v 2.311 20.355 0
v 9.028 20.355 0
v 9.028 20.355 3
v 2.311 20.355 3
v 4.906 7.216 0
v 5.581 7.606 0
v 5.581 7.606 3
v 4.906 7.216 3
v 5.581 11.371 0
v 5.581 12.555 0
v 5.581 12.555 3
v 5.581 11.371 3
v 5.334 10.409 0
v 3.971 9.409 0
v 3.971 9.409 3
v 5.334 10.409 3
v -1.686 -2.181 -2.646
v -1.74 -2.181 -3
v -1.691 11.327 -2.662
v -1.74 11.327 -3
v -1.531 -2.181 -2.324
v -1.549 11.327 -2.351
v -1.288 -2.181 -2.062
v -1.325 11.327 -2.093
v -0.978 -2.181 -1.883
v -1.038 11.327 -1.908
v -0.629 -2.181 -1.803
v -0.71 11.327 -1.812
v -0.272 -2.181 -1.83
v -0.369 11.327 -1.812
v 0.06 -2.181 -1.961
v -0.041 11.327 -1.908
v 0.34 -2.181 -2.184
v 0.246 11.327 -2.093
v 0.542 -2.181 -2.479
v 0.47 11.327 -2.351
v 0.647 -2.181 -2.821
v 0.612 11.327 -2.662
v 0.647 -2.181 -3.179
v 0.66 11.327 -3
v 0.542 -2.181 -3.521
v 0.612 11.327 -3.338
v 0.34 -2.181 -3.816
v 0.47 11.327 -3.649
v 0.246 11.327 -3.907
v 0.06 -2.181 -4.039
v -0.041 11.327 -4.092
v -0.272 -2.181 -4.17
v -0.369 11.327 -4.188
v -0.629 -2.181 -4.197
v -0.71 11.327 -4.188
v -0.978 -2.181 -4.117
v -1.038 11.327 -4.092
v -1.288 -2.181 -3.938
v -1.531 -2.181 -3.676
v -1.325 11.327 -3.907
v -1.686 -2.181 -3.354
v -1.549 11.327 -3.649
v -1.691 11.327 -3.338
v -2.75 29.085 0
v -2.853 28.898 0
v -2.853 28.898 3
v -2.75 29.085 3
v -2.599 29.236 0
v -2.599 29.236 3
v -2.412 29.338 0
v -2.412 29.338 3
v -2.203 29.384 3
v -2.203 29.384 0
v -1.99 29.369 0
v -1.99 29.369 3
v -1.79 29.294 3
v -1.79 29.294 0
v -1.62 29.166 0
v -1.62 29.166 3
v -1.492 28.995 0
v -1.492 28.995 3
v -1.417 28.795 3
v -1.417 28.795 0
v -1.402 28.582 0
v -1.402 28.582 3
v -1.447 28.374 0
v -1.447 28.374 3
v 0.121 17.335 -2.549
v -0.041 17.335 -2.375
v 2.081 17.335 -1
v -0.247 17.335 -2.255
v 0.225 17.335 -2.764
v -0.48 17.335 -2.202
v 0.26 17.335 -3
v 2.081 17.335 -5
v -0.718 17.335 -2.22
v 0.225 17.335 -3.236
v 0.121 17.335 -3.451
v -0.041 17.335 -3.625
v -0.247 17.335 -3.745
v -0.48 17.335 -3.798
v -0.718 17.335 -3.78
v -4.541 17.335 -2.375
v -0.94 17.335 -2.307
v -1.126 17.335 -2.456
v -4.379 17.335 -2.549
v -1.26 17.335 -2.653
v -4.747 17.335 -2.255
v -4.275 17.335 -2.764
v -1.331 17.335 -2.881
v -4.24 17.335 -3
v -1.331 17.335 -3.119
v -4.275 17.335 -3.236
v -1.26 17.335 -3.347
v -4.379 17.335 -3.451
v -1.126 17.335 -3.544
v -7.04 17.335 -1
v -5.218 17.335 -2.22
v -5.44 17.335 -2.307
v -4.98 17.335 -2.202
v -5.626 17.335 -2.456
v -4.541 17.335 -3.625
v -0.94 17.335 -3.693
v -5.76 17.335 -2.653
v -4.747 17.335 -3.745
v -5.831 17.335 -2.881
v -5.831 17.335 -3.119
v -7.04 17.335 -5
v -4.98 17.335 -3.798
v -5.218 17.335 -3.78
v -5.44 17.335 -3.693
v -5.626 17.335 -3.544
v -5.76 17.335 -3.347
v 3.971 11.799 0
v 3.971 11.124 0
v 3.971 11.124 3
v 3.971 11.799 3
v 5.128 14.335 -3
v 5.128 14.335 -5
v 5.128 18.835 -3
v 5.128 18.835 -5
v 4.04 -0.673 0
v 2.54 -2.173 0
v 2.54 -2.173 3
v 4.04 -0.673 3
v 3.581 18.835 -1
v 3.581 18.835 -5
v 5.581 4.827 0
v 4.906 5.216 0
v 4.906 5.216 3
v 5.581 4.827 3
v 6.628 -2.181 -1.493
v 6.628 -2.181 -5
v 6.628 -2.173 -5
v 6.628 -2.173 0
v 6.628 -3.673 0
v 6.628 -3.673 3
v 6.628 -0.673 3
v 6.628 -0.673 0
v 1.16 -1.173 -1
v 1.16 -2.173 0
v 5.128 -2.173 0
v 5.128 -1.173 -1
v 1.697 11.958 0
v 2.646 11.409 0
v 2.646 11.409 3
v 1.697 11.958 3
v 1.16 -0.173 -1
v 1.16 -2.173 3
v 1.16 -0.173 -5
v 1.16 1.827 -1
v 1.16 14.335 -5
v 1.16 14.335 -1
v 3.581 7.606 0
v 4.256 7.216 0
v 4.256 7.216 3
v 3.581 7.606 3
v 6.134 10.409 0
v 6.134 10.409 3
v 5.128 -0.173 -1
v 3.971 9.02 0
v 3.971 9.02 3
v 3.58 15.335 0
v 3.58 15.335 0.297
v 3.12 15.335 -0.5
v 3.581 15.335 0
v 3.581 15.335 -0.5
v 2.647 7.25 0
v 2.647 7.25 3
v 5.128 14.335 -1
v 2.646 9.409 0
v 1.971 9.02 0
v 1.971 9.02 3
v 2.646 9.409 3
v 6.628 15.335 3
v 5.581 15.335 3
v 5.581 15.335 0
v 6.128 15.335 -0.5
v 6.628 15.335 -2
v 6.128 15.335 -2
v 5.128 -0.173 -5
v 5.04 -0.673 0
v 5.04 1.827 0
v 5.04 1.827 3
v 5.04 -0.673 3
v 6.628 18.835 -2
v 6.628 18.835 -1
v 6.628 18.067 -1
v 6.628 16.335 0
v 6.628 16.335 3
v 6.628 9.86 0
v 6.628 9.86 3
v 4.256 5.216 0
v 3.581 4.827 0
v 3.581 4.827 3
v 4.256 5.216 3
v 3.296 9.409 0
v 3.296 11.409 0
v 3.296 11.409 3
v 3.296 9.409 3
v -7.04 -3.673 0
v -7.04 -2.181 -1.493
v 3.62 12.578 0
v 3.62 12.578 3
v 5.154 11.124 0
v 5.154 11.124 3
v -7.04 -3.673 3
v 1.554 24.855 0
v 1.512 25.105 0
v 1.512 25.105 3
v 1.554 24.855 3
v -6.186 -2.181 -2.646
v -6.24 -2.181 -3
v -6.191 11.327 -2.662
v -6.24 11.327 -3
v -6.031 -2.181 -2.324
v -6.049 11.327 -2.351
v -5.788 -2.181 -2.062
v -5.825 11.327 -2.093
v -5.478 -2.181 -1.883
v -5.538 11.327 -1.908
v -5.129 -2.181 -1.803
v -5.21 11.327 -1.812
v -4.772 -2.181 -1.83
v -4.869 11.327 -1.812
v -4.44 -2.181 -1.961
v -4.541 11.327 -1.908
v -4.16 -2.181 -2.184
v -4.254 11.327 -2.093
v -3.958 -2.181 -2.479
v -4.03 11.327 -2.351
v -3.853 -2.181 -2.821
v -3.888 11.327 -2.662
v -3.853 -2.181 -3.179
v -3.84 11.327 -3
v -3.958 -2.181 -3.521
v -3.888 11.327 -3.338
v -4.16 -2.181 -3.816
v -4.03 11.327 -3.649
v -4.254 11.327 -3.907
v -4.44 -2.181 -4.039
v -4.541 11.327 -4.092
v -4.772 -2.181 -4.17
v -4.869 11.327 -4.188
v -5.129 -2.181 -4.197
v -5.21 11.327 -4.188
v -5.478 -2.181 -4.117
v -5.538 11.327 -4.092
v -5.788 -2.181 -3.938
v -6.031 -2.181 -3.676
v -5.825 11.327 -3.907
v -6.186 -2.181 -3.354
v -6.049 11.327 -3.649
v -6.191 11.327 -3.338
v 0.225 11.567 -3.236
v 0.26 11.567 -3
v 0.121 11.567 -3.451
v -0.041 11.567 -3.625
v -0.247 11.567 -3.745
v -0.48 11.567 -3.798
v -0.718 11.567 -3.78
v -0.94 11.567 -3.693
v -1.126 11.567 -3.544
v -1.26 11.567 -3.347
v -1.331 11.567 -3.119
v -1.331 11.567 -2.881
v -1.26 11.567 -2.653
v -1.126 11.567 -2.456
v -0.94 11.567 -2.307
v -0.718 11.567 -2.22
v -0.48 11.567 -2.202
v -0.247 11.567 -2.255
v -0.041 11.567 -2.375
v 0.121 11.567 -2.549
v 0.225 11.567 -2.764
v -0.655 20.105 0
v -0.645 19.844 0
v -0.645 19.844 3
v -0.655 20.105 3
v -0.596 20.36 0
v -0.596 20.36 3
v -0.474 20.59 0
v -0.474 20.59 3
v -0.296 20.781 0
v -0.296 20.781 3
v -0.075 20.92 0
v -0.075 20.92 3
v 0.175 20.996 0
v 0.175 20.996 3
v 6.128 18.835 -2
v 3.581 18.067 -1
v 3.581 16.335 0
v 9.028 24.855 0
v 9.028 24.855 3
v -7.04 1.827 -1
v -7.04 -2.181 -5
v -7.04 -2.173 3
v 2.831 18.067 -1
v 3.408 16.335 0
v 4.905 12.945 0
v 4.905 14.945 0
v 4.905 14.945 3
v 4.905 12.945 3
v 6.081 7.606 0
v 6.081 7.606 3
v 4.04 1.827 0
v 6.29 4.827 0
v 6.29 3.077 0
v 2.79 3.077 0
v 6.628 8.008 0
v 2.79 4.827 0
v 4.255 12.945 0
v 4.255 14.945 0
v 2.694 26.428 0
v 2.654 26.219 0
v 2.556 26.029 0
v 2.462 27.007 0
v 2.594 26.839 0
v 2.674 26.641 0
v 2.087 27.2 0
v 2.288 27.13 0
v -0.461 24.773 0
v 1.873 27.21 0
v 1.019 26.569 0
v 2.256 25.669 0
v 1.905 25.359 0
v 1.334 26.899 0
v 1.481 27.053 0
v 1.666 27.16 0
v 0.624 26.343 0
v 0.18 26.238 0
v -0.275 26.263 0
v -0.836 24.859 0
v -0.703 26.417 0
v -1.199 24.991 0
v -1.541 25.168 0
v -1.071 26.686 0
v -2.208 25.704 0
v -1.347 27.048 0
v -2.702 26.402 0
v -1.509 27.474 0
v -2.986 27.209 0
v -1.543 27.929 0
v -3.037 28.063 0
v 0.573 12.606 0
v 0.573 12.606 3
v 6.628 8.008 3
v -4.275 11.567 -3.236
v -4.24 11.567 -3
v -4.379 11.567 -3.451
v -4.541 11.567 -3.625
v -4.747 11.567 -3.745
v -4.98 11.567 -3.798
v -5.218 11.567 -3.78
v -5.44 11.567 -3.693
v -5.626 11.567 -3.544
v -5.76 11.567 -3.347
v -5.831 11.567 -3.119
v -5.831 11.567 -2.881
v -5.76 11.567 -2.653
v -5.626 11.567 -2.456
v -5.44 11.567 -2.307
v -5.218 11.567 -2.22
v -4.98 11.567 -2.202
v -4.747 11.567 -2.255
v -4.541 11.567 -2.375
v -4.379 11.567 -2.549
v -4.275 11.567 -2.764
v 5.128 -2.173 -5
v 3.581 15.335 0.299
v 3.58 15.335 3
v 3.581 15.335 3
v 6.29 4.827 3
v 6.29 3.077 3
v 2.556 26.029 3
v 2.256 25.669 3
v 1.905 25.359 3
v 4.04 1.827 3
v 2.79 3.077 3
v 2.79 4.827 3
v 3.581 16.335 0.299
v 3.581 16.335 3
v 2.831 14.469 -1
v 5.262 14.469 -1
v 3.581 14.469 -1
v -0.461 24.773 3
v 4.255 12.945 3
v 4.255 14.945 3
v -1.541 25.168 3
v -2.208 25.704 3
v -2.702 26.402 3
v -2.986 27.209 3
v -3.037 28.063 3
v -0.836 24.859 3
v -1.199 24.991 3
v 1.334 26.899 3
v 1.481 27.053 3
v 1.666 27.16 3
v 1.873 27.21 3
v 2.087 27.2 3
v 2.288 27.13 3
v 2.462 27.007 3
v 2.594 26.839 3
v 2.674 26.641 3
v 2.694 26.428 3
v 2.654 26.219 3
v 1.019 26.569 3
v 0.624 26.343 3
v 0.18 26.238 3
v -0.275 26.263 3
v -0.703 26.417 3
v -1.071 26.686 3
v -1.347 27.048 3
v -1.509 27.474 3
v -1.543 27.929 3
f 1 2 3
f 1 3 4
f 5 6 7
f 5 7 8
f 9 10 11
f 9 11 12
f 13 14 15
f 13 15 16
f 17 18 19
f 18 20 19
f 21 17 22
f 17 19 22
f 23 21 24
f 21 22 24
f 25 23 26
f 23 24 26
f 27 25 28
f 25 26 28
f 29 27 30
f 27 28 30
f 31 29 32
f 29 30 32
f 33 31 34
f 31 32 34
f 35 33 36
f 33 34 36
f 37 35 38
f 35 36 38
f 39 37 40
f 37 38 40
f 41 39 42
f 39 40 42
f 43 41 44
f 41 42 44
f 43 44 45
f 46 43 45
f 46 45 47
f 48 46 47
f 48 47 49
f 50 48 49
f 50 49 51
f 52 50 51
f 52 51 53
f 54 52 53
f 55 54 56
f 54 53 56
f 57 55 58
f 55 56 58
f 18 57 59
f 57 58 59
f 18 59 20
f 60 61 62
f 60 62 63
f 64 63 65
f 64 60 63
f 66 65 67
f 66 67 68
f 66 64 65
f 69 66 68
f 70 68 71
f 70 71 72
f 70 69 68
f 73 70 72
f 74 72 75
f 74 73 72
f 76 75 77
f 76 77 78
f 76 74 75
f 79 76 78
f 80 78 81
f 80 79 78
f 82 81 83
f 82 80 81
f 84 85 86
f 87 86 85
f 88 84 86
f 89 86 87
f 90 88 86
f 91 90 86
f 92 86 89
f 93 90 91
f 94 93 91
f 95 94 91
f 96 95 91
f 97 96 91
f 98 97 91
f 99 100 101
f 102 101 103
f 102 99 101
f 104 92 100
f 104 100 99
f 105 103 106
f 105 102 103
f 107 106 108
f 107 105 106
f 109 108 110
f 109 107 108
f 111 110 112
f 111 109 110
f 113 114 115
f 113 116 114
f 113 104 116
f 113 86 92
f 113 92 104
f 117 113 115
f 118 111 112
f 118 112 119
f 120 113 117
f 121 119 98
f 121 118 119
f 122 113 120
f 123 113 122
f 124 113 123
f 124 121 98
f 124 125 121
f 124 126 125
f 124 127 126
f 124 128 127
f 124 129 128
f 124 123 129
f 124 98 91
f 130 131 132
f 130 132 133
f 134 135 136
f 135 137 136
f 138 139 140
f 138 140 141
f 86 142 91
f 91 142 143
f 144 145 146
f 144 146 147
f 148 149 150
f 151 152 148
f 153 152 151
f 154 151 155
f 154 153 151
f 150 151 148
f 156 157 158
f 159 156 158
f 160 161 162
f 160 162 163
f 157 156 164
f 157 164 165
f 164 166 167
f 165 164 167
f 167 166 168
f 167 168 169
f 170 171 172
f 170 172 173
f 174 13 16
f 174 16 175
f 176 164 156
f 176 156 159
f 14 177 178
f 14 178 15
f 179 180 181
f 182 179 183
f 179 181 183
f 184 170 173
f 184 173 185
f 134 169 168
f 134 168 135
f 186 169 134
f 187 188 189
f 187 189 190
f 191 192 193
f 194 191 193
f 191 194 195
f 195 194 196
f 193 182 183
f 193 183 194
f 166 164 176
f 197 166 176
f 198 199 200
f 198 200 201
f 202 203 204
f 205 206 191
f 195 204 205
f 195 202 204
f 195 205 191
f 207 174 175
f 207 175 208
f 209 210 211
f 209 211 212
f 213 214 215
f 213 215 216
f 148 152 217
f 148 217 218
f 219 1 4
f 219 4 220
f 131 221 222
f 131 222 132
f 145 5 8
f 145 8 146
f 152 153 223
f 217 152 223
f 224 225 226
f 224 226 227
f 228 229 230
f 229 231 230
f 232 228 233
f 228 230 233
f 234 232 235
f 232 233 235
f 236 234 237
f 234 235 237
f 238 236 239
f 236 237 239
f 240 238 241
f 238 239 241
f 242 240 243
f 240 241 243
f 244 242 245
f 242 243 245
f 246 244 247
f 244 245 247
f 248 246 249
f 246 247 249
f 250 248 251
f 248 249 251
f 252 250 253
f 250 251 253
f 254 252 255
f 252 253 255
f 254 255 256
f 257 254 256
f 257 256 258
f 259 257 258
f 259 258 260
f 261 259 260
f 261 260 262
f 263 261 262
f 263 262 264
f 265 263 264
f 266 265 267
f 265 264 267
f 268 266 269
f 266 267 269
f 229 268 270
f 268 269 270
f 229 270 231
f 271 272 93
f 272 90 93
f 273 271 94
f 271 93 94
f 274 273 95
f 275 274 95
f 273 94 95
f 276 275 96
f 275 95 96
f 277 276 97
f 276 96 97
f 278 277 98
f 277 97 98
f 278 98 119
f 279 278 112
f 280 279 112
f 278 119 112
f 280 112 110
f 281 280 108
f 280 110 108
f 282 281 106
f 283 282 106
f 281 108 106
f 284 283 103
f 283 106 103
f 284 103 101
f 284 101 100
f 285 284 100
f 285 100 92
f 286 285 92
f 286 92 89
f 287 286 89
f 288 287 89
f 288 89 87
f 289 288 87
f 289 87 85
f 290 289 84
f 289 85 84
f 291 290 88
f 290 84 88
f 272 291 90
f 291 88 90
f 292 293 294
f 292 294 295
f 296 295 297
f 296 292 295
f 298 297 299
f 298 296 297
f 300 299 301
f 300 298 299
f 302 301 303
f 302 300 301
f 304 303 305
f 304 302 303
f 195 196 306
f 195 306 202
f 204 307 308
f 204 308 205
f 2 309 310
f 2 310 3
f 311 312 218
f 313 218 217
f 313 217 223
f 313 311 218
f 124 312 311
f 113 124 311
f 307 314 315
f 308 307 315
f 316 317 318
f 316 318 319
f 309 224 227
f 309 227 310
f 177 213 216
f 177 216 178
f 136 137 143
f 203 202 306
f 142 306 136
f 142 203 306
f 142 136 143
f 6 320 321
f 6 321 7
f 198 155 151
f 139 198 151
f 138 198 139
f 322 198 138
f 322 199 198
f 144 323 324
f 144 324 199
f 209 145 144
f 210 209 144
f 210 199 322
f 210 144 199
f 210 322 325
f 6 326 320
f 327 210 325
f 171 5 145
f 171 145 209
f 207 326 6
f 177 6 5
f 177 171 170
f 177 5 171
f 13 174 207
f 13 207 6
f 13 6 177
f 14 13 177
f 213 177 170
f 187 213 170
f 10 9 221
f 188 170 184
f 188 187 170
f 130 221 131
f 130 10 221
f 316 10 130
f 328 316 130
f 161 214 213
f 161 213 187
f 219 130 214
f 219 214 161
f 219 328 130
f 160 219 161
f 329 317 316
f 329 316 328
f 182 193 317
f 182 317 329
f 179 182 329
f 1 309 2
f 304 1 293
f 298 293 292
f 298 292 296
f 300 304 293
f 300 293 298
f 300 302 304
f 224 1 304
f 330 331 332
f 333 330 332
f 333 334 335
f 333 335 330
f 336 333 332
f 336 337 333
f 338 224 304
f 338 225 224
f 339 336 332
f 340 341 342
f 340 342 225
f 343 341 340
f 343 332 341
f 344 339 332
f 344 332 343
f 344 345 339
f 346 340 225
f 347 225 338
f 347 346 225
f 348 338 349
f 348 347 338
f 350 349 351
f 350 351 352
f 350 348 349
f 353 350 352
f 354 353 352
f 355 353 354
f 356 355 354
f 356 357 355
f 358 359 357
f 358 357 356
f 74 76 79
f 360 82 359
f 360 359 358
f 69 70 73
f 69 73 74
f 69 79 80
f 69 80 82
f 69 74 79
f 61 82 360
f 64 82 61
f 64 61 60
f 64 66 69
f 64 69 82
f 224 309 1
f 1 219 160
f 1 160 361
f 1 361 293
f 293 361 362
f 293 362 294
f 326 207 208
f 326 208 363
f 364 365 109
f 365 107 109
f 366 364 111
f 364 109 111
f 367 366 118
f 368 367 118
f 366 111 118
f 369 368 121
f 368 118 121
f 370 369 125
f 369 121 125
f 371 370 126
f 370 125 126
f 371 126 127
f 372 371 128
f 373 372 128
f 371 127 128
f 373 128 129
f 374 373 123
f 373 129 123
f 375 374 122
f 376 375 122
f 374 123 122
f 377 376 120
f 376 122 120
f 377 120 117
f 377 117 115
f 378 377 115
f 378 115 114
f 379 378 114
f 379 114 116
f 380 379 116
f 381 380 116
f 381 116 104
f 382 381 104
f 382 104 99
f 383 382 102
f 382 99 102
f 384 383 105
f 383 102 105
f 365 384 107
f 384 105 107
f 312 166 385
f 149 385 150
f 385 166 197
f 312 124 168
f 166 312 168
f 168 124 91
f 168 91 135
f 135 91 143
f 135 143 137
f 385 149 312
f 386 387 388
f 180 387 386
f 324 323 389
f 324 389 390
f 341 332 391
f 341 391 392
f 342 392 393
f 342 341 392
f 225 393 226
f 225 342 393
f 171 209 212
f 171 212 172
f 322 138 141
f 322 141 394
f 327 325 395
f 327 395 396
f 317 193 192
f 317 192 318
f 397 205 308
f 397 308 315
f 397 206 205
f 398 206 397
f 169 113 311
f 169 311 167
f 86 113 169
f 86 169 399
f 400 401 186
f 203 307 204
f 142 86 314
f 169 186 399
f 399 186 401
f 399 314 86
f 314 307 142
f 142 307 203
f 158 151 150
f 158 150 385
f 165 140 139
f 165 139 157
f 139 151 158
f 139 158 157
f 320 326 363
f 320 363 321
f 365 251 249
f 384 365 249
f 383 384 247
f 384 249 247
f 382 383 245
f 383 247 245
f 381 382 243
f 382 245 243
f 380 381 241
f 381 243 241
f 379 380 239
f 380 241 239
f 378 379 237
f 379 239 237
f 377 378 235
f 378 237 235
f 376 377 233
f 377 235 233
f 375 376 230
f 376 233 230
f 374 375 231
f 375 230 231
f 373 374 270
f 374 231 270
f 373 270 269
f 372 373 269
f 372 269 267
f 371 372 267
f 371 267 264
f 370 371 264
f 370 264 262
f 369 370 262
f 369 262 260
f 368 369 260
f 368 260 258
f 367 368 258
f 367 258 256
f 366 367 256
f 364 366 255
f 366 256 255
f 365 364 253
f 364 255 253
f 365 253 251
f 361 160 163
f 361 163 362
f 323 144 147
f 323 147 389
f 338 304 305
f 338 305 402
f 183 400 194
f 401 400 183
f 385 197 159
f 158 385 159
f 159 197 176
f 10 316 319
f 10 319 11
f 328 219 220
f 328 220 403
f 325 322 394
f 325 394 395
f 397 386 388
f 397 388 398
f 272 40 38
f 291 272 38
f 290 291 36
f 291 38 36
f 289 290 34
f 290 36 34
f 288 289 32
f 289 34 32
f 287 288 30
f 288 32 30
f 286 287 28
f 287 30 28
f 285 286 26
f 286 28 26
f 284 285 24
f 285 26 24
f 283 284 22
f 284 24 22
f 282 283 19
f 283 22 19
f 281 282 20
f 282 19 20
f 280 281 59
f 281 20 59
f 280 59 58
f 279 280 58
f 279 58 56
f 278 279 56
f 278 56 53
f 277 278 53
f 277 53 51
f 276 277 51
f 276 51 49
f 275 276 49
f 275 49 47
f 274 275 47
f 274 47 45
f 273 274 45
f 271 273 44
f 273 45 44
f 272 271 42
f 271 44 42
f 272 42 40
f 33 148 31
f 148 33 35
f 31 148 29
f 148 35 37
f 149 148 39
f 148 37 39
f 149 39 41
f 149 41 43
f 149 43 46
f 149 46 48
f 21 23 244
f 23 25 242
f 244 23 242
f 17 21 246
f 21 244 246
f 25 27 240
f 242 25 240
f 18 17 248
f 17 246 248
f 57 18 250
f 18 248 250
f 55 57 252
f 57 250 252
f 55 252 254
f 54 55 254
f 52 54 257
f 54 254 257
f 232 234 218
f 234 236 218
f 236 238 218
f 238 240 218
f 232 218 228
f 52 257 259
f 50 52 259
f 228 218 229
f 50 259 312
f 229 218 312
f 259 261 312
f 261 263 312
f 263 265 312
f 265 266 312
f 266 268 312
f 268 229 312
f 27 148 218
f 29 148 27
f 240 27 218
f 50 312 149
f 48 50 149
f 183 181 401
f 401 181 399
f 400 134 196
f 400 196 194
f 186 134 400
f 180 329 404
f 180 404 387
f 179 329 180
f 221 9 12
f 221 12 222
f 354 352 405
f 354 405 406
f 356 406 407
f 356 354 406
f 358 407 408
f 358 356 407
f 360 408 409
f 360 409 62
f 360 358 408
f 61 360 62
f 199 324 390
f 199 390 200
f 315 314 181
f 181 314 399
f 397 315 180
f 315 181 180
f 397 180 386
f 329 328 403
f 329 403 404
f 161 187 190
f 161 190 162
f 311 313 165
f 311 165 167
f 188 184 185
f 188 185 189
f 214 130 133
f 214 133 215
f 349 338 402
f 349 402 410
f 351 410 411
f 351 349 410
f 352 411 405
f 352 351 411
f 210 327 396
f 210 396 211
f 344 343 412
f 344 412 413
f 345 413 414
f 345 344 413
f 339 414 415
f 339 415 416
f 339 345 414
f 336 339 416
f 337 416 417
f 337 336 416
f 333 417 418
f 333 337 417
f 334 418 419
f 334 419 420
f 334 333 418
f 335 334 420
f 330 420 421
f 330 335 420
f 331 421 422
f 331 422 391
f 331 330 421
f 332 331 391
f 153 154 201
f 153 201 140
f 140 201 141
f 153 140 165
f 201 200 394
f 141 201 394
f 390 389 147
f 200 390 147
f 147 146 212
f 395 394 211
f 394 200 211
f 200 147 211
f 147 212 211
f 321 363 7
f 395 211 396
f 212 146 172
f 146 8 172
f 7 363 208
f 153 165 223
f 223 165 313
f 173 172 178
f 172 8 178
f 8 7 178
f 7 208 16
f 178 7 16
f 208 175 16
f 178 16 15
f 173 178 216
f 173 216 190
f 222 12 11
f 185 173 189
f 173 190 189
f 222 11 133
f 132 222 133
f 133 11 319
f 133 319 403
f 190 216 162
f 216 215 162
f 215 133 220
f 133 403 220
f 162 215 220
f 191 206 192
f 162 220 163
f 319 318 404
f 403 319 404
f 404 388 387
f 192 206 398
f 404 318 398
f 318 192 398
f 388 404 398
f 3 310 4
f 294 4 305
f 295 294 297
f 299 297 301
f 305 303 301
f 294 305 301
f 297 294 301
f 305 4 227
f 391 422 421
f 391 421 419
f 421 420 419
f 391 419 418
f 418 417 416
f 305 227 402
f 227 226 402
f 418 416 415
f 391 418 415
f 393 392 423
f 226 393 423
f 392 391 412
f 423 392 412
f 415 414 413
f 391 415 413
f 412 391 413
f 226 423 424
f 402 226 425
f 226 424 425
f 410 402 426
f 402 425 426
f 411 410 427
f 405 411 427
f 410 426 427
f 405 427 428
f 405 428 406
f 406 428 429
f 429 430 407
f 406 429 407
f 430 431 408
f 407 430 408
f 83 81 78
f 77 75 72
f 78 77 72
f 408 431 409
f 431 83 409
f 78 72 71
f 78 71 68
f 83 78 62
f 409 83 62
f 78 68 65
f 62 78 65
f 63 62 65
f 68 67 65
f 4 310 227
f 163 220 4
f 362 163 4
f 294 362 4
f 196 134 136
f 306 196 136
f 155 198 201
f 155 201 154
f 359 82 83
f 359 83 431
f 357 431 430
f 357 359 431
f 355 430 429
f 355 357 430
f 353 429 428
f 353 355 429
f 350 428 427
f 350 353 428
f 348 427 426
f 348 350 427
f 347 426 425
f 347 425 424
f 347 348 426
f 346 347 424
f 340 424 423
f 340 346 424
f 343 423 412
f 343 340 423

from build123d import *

# Parameters (mm, degrees)
BOSS_SWITCH_BODY_DEPTH                    = 3
SKETCH1_W                                 = 4.0875
SKETCH1_H                                 = 1.5
SKETCH1_W_2                               = 3.046903414
SKETCH1_H_2                               = 3.5
BOSS_FLANGE_WIDTH_DEPTH                   = 5
SKETCH2_W                                 = 4
SKETCH2_H                                 = 2
SKETCH2_W_2                               = 8
SKETCH2_H_2                               = 1.5
BOSS_FLANGE_HEIGHT_DEPTH                  = 10.620596586
CUT_UP_TO_DOWN_DERAILLEUR_CLEARANCE_REACH = 23.629
SKETCH10_W                                = 1.5
SKETCH10_H                                = 3
SKETCH17_W                                = 12.1675
SKETCH17_H                                = 4
BOSS_FLANGE_SUPPORT_DEPTH                 = 17.508325141
TAP_DRILL_FOR_M2X0_4_TAP1_D               = 1.6
M2_CLEARANCE_HOLE2_D                      = 2.4
M2_CLEARANCE_HOLE2_DEPTH                  = 15
M2_CLEARANCE_HOLE2_TIP                    = 0.721032743
CHAMFER_FLANGE_SUPPORT_SIZE               = 1.5
CHAMFER_FLANGE_SUPPORT_2_SIZE             = 1
SKETCH28_W                                = 3.046903414
SKETCH28_H                                = 2.5
CUT_EXTRUDE1_DEPTH                        = 1
CHAMFER10_SIZE                            = 1
CHAMFER10_SIZE2                           = 1.732050808
CHAMFER_FLANGE_SUPPORT_3_SIZE             = 1
CUT_EXTRUDE2_DEPTH                        = 34.862828732
CHAMFER12_SIZE                            = 0.5
CHAMFER12_SIZE2                           = 0.866025404
SKETCH23_W                                = 7.42721664
SKETCH23_H                                = 14.508325141
CUT_GAP_FOR_PRINTING_DEPTH                = 32.000499688
BOSS_EXTRUDE2_DEPTH                       = 8.2
CHAMFER11_SIZE                            = 0.75
CHAMFER11_SIZE_2                          = 1.299038106


# Some blends are built 0.0001 mm under size
with BuildPart() as part:
    # Sketch-SwitchBossUp → Boss-Switch Body (new body)
    with BuildSketch(Plane.XY):
        with BuildLine():
            Line((5.581091204, 12.554885442), (5.58109997, 11.370542897))
            Line((5.58109997, 11.370542897), (5.154266051, 11.12411022))
            Line((5.154266051, 11.12411022), (3.971266051, 11.12411022))
            Line((3.971266051, 11.12411022), (3.97126394, 11.79911022))
            Line((3.97126394, 11.79911022), (3.296271341, 11.409403061))
            Line((3.296271341, 11.409403061), (3.296271341, 9.409403061))
            Line((3.296271341, 9.409403061), (3.971278743, 9.019687356))
            Line((3.971278743, 9.019687356), (3.971278743, 9.409408058))
            Line((3.971278743, 9.409408058), (5.333511297, 10.40941814))
            Line((5.333511297, 10.40941814), (6.133511297, 10.409424062))
            Line((6.133511297, 10.409424062), (6.627976927, 9.860264345))
            Line((6.627976927, 9.860264345), (6.627976927, 8.007577878))
            Line((6.627976927, 8.007577878), (6.081127833, 7.606137899))
            Line((6.081127833, 7.606137899), (5.581127833, 7.606137899))
            Line((5.581127833, 7.606137899), (4.906138119, 7.216432406))
            Line((4.906138119, 7.216432406), (4.906138119, 5.216432406))
            Line((4.906138119, 5.216432406), (5.58114552, 4.826716701))
            Line((5.58114552, 4.826716701), (6.290476927, 4.826716701))
            Line((6.290476927, 4.826716701), (6.290476927, 3.076720436))
            Line((6.290476927, 3.076720436), (5.040476927, 1.826720436))
            Line((5.040476927, 1.826720436), (5.040476927, -0.673279564))
            Line((5.040476927, -0.673279564), (6.627976927, -0.673279564))
            Line((6.627976927, -0.673279564), (6.627976927, -3.673279564))
            Line((6.627976927, -3.673279564), (2.540476927, -3.673279564))
            Line((2.540476927, -3.673279564), (2.540476927, -2.173279564))
            Line((2.540476927, -2.173279564), (4.040476927, -0.673279564))
            Line((4.040476927, -0.673279564), (4.040476927, 1.826720436))
            Line((4.040476927, 1.826720436), (2.790476927, 3.076720436))
            Line((2.790476927, 3.076720436), (2.790476927, 4.826720436))
            Line((2.790476927, 4.826720436), (3.58114552, 4.826720436))
            Line((3.58114552, 4.826720436), (4.256138119, 5.216427595))
            Line((4.256138119, 5.216427595), (4.256138119, 7.216427595))
            Line((4.256138119, 7.216427595), (3.581130717, 7.6061433))
            Line((3.581130717, 7.6061433), (2.64686251, 7.249572244))
            Line((2.64686251, 7.249572244), (1.971281627, 9.019692757))
            Line((1.971281627, 9.019692757), (2.646271341, 9.40939825))
            Line((2.646271341, 9.40939825), (2.646271341, 11.40939825))
            Line((2.646271341, 11.40939825), (1.696557212, 11.957715958))
            Line((1.696557212, 11.957715958), (0.573317845, 12.60621851))
            Line((0.573317845, 12.60621851), (-0.645153605, 19.844362607))
            ThreePointArc((-0.645153605, 19.844362607), (-0.473707256, 20.590279886), (0.174966786, 20.996492176))
            Line((0.174966786, 20.996492176), (-0.46073685, 24.772792819))
            ThreePointArc((-0.46073685, 24.772792819), (-1.019582136, 24.919522879), (-1.541303694, 25.167805745))
            ThreePointArc((-1.541303694, 25.167805745), (-2.872284003, 26.795385437), (-2.852546321, 28.897797067))
            ThreePointArc((-2.852546321, 28.897797067), (-1.887813913, 29.338582026), (-1.447028953, 28.373849618))
            ThreePointArc((-1.447028953, 28.373849618), (-0.703448682, 26.416936722), (1.333779254, 26.898727173))
            ThreePointArc((1.333779254, 26.898727173), (2.379722745, 27.074801628), (2.555797201, 26.028858137))
            ThreePointArc((2.555797201, 26.028858137), (2.086504637, 25.507104397), (1.511513111, 25.104801997))
            Line((1.511513111, 25.104801997), (1.553598189, 24.854801997))
            Line((1.553598189, 24.854801997), (9.027976927, 24.854801997))
            Line((9.027976927, 24.854801997), (9.027976927, 22.354801997))
            Line((9.027976927, 22.354801997), (9.027976927, 20.354801997))
            Line((9.027976927, 20.354801997), (2.311129602, 20.354801997))
            Line((2.311129602, 20.354801997), (3.620242387, 12.578216848))
            Line((3.620242387, 12.578216848), (4.255457038, 12.944958198))
            Line((4.255457038, 12.944958198), (4.255457038, 14.944958198))
            Line((4.255457038, 14.944958198), (3.579805878, 15.335045577))
            Line((3.579805878, 15.335045577), (3.581073513, 15.335045577))
            Line((3.581073513, 15.335045577), (3.581073513, 16.335045577))
            Line((3.581073513, 16.335045577), (5.725580434, 16.335045577))
            Line((5.725580434, 16.335045577), (6.627976927, 16.335045577))
            Line((6.627976927, 16.335045577), (6.627976927, 15.335045577))
            Line((6.627976927, 15.335045577), (5.581099865, 15.335045577))
            Line((5.581099865, 15.335045577), (4.905457038, 14.944963009))
            Line((4.905457038, 14.944963009), (4.905457038, 12.944963009))
            Line((4.905457038, 12.944963009), (5.581091204, 12.554885442))
        make_face()
    extrude(amount=BOSS_SWITCH_BODY_DEPTH)

    # Sketch1 → Boss-Flange Width (add)
    with BuildSketch(Plane(origin=(0, 0, 0), x_dir=(-1, 0, 0), z_dir=(0, 0, -1))):
        with Locations((-4.584226927, -2.923279564)):
            Rectangle(SKETCH1_W, SKETCH1_H)
        with Locations((-5.10452522, 17.085045577)):
            Rectangle(SKETCH1_W_2, SKETCH1_H_2)
    extrude(amount=BOSS_FLANGE_WIDTH_DEPTH)

    # Sketch2 → Boss-Flange Height (add)
    with BuildSketch(Plane(origin=(-7.039523073, 0, 0), x_dir=(0, 0, -1), z_dir=(1, 0, 0))):
        with Locations((3, 16.335045577)):
            Rectangle(SKETCH2_W, SKETCH2_H)
        with Locations((1, -2.923279564)):
            Rectangle(SKETCH2_W_2, SKETCH2_H_2)
    extrude(amount=BOSS_FLANGE_HEIGHT_DEPTH)

    # Sketch10 → Cut-Up-To-Down Derailleur Clearance (cut, up to next)
    with BuildSketch(Plane(origin=(0, 15.335045577, 0), x_dir=(1, 0, 0), z_dir=(0, 1, 0)), mode=Mode.PRIVATE) as cut_up_to_down_derailleur_clearance_sk1:
        with Locations((5.877976927, 3.5)):
            Rectangle(SKETCH10_W, SKETCH10_H)
    cut_up_to_down_derailleur_clearance_tool1 = extrude(cut_up_to_down_derailleur_clearance_sk1.sketch, amount=CUT_UP_TO_DOWN_DERAILLEUR_CLEARANCE_REACH, mode=Mode.PRIVATE) & part.part
    add(cut_up_to_down_derailleur_clearance_tool1.solids().sort_by_distance((5.877977, 15.335046, -3.5))[0], mode=Mode.SUBTRACT)

    # Sketch17 → Boss-Flange Support (add)
    with BuildSketch(Plane.XZ.offset(-15.335045577)):
        with Locations((-0.955773073, -3)):
            Rectangle(SKETCH17_W, SKETCH17_H)
    extrude(amount=BOSS_FLANGE_SUPPORT_DEPTH)

    # Tap Drill for M2x0.4 Tap1 (through all)
    with Locations(Plane(origin=(0, -3.673279564, 0), x_dir=(-1, 0, 0), z_dir=(0, -1, 0))):
        with Locations((5.039523073, 3), (0.539523073, 3)):
            Hole(TAP_DRILL_FOR_M2X0_4_TAP1_D / 2)

    # M2 Clearance Hole2
    with Locations(Plane.XZ.offset(3.673279564)):
        with Locations((-5.039523073, -3), (-0.539523073, -3)):
            Hole(M2_CLEARANCE_HOLE2_D / 2, depth=M2_CLEARANCE_HOLE2_DEPTH)
            with Locations((0, 0, -(M2_CLEARANCE_HOLE2_DEPTH + M2_CLEARANCE_HOLE2_TIP / 2))):  # 118° drill point
                Cone(0, M2_CLEARANCE_HOLE2_D / 2, M2_CLEARANCE_HOLE2_TIP, mode=Mode.SUBTRACT)

    # Chamfer-Flange Support
    chamfer_flange_support_edges = [part.edges().sort_by_distance(p)[0] for p in [
        (3.581073513, 17.335045577, -3),
    ]]
    chamfer(chamfer_flange_support_edges, length=CHAMFER_FLANGE_SUPPORT_SIZE - 0.0001)  # a hair under: the kernel refuses the full size

    # Chamfer-Flange Support 2
    chamfer_flange_support_2_edges = [part.edges().sort_by_distance(p)[0] for p in [
        (5.127976927, 17.085045577, -2),
        (5.127976927, 15.335045577, -1.5),
    ]]
    chamfer(chamfer_flange_support_2_edges, length=CHAMFER_FLANGE_SUPPORT_2_SIZE)

    # Sketch28 → Cut-Extrude1 (cut)
    with BuildSketch(Plane.XY.offset(-1)):
        with Locations((5.10452522, 17.585045577)):
            Rectangle(SKETCH28_W, SKETCH28_H)
    extrude(amount=CUT_EXTRUDE1_DEPTH, mode=Mode.SUBTRACT)

    # Chamfer10
    chamfer10_edges = [part.edges().sort_by_distance(p)[0] for p in [
        (5.10452522, 16.335045577, -1),
    ]]
    chamfer10_side = [part.faces().sort_by_distance(p)[0] for p in [
        (5.10452522, 16.335045577, 1),
    ]]
    chamfer(chamfer10_edges, length=CHAMFER10_SIZE, length2=CHAMFER10_SIZE2, reference=chamfer10_side[0])

    # Chamfer-Flange Support 3
    chamfer_flange_support_3_edges = [part.edges().sort_by_distance(p)[0] for p in [
        (-0.955773073, -2.173279564, -1),
    ]]
    chamfer(chamfer_flange_support_3_edges, length=CHAMFER_FLANGE_SUPPORT_3_SIZE - 0.0001)  # a hair under: the kernel refuses the full size

    # Sketch31 → Cut-Extrude2 (cut, through all)
    with BuildSketch(Plane.ZY.offset(7.039523073)):
        Polygon((-5, -2.180661432), (-5, -3.673279564), (0, -3.673279564), (-1.492618132, -2.180661432), align=None)
    extrude(amount=-CUT_EXTRUDE2_DEPTH, mode=Mode.SUBTRACT)

    # Chamfer12
    chamfer12_edges = [part.edges().sort_by_distance(p)[0] for p in [
        (4.85452522, 15.335045577, -1),
    ]]
    chamfer12_side = [part.faces().sort_by_distance(p)[0] for p in [
        (5.669366922, 15.335045577, 0.364483359),
    ]]
    chamfer(chamfer12_edges, length=CHAMFER12_SIZE, length2=CHAMFER12_SIZE2, reference=chamfer12_side[0])

    # Sketch23 → Cut-Gap for Printing (cut, through all)
    with BuildSketch(Plane.XY.offset(-1)):
        with Locations((4.874085247, 7.080883007)):
            Rectangle(SKETCH23_W, SKETCH23_H)
    extrude(amount=-CUT_GAP_FOR_PRINTING_DEPTH, mode=Mode.SUBTRACT)

    # Sketch32 → Boss-Extrude2 (add)
    with BuildSketch(Plane.ZY.offset(7.039523073)):
        Polygon((3, -2.173279564), (-1, 1.826720436), (-1, -2.082793031), (0.406297605, -3.355496176), (3, -3.355496176), align=None)
    extrude(amount=-BOSS_EXTRUDE2_DEPTH)

    # Chamfer11
    # the kernel refuses this chamfer: 1.299038106, 0.75 mm, written as the material it adds along each edge
    with BuildSketch(Plane(origin=(3.581073513, 11.108297196, -1), x_dir=(-0.9983227437537926, 0, -0.05789386240267147), z_dir=(0, 1, 0))) as chamfer11_piece_1_section:
        Polygon((CHAMFER11_SIZE * 0.998322743754, CHAMFER11_SIZE * 0.0578938624027), (-CHAMFER11_SIZE_2 * 0.0578938623883, CHAMFER11_SIZE_2 * 0.998322743505), (0, 0), align=None)
    chamfer11_piece_1 = extrude(amount=5.226748382, mode=Mode.PRIVATE)
    chamfer11_piece_1 = split(chamfer11_piece_1, bisect_by=Plane(origin=(3.144000621, 15.335045577, -0.473759617), z_dir=(1.4013159114223785e-12, 1.0, 0)), keep=Keep.TOP, mode=Mode.PRIVATE)
    add(chamfer11_piece_1)
    with BuildSketch(Plane(origin=(3.581073513, 11.108297196, -1), x_dir=(-0.9983227437537926, 0, -0.05789386240267147), z_dir=(0, 1, 0))) as chamfer11_piece_2_section:
        Polygon((CHAMFER11_SIZE * 0.998322743754, CHAMFER11_SIZE * 0.0578938624027), (-CHAMFER11_SIZE_2 * 0.0578938623883, CHAMFER11_SIZE_2 * 0.998322743505), (0, 0), align=None)
    chamfer11_piece_2 = extrude(amount=5.226748382, mode=Mode.PRIVATE)
    chamfer11_piece_2 = split(chamfer11_piece_2, bisect_by=Plane(origin=(3.059810406, 14.920794757, -0.739167823), z_dir=(0, 0.4999999999999982, -0.8660254037844397)), keep=Keep.TOP, mode=Mode.PRIVATE)
    add(chamfer11_piece_2)
    with BuildSketch(Plane(origin=(3.581073513, 16.335045577, -1), x_dir=(-0.9983227437537926, 0, -0.05789386240267147), z_dir=(0, 1, 0))) as chamfer11_piece_3_section:
        Polygon((CHAMFER11_SIZE * 0.998322743754, CHAMFER11_SIZE * 0.0578938624027), (-CHAMFER11_SIZE_2 * 0.0578938623883, CHAMFER11_SIZE_2 * 0.998322743505), (0, 0), align=None)
    chamfer11_piece_3 = extrude(amount=5.092773786, mode=Mode.PRIVATE)
    chamfer11_piece_3 = split(chamfer11_piece_3, bisect_by=Plane(origin=(3.285691508, 17.119009851, -0.452621985), z_dir=(0, -0.4999999999999982, -0.8660254037844397)), keep=Keep.TOP, mode=Mode.PRIVATE)
    add(chamfer11_piece_3)


solid = part.part
